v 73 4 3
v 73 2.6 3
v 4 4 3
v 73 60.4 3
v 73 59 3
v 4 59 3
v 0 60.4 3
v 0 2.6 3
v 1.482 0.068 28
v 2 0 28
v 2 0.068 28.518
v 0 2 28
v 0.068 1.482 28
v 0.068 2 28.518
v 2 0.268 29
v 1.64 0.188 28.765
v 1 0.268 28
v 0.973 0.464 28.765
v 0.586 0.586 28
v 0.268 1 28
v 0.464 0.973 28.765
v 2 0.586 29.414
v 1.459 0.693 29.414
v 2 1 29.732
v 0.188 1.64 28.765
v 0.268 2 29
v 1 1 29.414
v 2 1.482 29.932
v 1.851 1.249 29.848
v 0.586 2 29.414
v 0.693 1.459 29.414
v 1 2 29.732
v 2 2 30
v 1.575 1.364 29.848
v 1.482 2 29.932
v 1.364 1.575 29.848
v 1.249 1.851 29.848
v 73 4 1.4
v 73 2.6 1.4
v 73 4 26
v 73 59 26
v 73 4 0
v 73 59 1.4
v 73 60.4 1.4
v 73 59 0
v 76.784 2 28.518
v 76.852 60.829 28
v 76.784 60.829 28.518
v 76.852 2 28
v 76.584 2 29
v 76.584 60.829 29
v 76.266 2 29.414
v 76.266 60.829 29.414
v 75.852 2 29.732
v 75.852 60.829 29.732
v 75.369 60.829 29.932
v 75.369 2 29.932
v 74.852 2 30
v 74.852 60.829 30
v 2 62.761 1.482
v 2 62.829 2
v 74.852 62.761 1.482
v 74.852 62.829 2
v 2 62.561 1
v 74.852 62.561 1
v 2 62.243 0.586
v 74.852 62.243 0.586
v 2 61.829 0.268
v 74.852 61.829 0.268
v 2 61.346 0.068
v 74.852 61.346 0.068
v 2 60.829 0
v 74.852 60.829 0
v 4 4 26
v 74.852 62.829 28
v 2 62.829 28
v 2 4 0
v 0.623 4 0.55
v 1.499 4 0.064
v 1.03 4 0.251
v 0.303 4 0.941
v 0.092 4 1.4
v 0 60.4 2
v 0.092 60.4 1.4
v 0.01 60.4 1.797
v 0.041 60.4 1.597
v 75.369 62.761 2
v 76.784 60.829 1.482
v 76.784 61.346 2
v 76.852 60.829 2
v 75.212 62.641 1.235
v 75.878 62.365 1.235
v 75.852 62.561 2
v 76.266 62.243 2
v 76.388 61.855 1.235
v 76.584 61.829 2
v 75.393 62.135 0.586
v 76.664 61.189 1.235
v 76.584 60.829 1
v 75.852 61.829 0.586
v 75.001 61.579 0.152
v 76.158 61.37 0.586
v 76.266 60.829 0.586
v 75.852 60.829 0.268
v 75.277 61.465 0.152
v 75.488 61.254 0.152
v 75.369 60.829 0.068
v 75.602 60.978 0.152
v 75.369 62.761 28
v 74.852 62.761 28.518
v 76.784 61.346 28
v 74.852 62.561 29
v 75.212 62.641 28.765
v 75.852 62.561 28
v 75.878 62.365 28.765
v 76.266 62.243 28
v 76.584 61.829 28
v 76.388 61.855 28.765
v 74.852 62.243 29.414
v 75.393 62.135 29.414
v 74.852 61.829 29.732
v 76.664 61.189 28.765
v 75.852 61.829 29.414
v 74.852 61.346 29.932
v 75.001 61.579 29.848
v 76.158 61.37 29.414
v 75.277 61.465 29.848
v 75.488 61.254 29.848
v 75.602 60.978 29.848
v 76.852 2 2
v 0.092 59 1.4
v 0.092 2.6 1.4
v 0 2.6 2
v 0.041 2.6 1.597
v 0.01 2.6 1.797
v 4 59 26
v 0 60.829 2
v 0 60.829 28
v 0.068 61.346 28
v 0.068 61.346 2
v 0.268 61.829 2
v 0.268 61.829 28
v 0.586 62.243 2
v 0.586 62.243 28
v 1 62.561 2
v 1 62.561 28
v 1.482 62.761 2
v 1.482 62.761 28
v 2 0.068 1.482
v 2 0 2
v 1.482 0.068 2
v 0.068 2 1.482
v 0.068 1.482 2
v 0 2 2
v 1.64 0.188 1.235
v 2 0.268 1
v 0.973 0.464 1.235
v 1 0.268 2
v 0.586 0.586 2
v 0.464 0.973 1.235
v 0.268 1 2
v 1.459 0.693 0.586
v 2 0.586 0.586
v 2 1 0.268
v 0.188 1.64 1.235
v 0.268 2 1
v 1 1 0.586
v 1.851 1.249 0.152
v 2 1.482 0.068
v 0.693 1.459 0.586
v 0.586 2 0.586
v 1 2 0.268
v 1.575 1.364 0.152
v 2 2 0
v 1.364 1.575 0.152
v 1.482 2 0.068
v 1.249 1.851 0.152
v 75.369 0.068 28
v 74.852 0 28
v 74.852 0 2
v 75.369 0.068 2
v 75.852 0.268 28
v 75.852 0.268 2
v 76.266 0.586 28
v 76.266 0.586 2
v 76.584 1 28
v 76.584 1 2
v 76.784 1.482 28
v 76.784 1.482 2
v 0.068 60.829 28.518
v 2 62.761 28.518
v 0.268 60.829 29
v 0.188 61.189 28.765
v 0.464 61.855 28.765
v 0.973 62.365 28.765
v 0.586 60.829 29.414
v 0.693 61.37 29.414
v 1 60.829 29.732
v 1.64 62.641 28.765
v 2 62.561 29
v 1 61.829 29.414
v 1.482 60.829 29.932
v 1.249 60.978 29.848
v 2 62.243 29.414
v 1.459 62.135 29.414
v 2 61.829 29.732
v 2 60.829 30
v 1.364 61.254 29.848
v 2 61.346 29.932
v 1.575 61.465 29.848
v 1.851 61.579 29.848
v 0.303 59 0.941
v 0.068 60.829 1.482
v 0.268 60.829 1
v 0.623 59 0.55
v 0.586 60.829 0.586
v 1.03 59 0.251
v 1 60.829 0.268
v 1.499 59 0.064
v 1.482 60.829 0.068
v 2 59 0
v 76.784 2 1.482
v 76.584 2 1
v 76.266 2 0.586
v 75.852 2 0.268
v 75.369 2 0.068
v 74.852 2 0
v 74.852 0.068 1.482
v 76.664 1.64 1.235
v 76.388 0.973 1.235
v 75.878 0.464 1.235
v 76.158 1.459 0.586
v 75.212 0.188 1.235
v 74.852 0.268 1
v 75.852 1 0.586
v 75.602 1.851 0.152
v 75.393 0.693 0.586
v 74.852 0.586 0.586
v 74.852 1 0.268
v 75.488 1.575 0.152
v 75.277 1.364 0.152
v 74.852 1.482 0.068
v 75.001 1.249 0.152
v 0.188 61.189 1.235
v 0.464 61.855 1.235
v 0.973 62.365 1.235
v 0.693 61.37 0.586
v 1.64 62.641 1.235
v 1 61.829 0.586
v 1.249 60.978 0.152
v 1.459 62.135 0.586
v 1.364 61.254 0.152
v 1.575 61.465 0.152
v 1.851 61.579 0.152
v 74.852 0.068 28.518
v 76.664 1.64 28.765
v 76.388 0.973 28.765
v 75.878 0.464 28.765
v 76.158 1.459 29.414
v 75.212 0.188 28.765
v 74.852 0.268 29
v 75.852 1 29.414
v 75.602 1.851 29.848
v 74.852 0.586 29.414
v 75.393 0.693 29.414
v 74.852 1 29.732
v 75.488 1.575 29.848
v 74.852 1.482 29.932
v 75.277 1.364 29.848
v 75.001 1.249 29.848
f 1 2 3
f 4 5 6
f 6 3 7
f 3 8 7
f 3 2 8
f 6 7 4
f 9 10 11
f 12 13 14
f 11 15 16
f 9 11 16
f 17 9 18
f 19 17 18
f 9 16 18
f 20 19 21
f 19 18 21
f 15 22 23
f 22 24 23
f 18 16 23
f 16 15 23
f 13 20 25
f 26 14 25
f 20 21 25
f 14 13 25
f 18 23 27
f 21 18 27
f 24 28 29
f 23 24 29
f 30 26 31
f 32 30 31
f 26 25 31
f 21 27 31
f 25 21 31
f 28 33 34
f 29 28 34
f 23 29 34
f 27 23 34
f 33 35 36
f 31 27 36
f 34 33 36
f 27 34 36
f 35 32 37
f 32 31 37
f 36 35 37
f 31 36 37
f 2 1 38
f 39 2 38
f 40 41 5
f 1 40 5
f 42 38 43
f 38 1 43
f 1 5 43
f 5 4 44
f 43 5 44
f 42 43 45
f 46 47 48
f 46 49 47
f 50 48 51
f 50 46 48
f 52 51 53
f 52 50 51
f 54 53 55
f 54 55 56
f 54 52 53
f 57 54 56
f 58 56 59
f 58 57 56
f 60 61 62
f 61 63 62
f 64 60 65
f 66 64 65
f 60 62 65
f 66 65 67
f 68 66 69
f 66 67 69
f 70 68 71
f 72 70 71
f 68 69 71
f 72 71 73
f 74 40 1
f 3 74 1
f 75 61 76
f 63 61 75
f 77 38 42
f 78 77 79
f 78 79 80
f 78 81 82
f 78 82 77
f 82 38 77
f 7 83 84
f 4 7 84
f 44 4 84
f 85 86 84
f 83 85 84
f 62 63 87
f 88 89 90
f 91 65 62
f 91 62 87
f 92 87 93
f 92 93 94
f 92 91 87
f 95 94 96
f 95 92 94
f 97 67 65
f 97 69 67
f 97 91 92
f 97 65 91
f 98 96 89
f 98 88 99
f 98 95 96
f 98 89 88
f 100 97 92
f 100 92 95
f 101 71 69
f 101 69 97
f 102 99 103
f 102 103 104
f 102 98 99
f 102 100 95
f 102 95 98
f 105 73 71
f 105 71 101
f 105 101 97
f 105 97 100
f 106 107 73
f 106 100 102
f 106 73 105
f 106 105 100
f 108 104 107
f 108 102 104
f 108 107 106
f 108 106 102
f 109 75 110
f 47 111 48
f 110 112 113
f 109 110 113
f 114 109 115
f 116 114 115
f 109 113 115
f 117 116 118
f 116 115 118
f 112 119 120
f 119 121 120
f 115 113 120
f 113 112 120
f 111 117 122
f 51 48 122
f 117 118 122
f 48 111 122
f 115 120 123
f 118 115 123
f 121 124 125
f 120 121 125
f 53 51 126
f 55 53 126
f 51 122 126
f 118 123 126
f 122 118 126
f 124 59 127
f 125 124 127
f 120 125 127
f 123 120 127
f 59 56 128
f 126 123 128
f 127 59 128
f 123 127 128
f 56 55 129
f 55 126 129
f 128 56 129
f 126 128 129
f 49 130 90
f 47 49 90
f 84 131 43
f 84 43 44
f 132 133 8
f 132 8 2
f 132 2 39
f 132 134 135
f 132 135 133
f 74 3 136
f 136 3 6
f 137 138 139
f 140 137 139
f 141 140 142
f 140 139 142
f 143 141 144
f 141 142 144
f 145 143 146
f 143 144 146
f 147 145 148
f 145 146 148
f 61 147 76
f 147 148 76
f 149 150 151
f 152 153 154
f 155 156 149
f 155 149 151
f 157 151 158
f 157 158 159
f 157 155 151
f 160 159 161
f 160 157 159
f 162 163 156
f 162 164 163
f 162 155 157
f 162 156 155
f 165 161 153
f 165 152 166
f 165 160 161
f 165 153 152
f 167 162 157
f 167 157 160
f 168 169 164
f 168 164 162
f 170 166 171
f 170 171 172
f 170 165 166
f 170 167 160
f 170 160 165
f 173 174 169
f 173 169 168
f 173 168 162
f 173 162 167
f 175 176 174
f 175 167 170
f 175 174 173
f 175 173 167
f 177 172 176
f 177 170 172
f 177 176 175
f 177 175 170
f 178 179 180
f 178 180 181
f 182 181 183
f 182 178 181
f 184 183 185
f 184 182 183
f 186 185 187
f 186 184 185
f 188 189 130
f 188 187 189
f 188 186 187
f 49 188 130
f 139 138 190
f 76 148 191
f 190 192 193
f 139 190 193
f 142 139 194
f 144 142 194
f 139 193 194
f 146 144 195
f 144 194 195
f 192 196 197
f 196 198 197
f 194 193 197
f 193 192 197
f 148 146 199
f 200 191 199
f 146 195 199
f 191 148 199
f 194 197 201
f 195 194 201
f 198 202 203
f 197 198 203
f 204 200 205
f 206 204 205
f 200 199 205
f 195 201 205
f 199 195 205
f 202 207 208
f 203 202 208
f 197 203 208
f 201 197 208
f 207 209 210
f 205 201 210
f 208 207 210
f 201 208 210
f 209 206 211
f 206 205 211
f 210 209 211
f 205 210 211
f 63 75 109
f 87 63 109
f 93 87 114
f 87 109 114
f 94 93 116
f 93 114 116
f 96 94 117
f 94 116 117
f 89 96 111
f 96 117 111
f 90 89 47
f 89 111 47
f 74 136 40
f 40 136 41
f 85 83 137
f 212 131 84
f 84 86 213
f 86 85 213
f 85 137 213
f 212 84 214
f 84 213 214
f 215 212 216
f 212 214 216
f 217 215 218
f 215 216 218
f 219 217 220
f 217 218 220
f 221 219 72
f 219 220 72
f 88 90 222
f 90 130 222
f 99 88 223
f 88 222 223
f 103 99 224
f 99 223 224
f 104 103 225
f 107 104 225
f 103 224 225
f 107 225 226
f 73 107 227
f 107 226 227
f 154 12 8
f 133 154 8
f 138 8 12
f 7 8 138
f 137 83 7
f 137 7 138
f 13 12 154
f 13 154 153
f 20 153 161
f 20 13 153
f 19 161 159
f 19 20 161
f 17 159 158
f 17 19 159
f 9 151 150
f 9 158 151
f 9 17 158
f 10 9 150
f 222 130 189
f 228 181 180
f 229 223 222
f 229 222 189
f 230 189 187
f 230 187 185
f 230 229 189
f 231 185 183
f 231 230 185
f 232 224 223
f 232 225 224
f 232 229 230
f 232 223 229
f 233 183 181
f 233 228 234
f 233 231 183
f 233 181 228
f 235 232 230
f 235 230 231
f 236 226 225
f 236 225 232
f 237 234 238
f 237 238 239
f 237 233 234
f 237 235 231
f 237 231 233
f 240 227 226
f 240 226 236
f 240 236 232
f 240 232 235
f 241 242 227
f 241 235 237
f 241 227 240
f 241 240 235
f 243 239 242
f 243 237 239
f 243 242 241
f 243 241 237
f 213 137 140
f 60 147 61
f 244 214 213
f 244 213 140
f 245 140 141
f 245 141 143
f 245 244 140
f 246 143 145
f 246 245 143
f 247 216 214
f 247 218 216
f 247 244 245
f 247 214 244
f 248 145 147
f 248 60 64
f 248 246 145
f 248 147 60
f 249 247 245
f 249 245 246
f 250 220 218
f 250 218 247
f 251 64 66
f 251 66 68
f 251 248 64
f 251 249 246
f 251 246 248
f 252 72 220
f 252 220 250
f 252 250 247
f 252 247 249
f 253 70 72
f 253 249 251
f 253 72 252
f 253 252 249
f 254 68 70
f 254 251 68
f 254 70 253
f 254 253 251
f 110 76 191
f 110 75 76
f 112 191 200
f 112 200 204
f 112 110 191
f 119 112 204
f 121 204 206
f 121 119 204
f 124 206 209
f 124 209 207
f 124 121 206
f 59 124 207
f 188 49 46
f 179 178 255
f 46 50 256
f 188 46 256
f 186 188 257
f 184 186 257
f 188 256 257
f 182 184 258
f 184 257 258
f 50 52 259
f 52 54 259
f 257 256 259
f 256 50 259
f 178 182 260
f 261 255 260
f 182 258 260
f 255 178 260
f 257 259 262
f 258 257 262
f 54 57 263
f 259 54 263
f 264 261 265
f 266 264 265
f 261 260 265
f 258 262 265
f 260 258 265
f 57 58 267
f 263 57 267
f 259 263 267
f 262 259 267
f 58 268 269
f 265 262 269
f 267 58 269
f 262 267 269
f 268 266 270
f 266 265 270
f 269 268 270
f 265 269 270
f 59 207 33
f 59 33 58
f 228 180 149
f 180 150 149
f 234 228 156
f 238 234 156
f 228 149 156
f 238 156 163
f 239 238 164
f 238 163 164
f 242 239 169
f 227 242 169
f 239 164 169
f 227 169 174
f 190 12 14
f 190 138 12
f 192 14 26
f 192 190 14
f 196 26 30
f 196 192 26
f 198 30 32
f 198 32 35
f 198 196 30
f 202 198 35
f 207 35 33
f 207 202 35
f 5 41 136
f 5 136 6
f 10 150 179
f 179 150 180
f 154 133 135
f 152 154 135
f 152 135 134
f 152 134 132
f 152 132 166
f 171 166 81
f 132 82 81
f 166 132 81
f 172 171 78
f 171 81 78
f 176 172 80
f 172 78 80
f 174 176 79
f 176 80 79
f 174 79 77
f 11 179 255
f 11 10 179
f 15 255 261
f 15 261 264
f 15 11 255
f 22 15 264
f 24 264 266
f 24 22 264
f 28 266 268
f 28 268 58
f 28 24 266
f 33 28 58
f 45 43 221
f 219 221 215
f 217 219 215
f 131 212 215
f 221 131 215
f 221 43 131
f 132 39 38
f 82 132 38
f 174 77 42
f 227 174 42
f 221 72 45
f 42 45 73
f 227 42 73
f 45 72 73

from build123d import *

# Parameters (mm, degrees)
CROQUIS3_W              = 76.851762212
CROQUIS3_H              = 62.828734274
SALIENTE_EXTRUIR1_DEPTH = 30
CROQUIS4_W              = 69
CROQUIS4_H              = 55
CORTAR_EXTRUIR1_DEPTH   = 26
REDONDEO5_R             = 2
REDONDEO6_R             = 2
REDONDEO7_R             = 2
CROQUIS5_W              = 3
CROQUIS5_H              = 55
CORTAR_EXTRUIR2_DEPTH   = 70
CROQUIS6_W              = 1.6
CROQUIS6_H              = 57.8
CORTAR_EXTRUIR3_DEPTH   = 73


with BuildPart() as part:
    # Croquis3 → Saliente-Extruir1 (new body)
    with BuildSketch(Plane.XY):
        with Locations((38.425881106, 31.414367137)):
            Rectangle(CROQUIS3_W, CROQUIS3_H)
    extrude(amount=SALIENTE_EXTRUIR1_DEPTH)

    # Croquis4 → Cortar-Extruir1 (cut)
    with BuildSketch(Plane.XY):
        with Locations((38.5, 31.5)):
            Rectangle(CROQUIS4_W, CROQUIS4_H)
    extrude(amount=CORTAR_EXTRUIR1_DEPTH, mode=Mode.SUBTRACT)

    # Redondeo5
    redondeo5_edges = [part.edges().sort_by_distance(p)[0] for p in [
        (0, 0, 15),
        (0, 62.828734274, 15),
        (76.851762212, 62.828734274, 15),
        (76.851762212, 0, 15),
    ]]
    fillet(redondeo5_edges, radius=REDONDEO5_R)

    # Redondeo6
    redondeo6_edges = [part.edges().sort_by_distance(p)[0] for p in [
        (0, 31.414367137, 0),
        (38.425881106, 0, 0),
        (38.425881106, 62.828734274, 0),
        (76.851762212, 31.414367137, 0),
        (76.265975775, 62.242947836, 0),
        (76.265975775, 0.585786438, 0),
        (0.585786438, 0.585786438, 0),
        (0.585786438, 62.242947836, 0),
    ]]
    fillet(redondeo6_edges, radius=REDONDEO6_R)

    # Redondeo7
    redondeo7_edges = [part.edges().sort_by_distance(p)[0] for p in [
        (0, 31.414367137, 30),
        (38.425881106, 62.828734274, 30),
        (38.425881106, 0, 30),
        (76.851762212, 31.414367137, 30),
        (76.265975775, 62.242947836, 30),
        (76.265975775, 0.585786438, 30),
        (0.585786438, 0.585786438, 30),
        (0.585786438, 62.242947836, 30),
    ]]
    fillet(redondeo7_edges, radius=REDONDEO7_R)

    # Croquis5 → Cortar-Extruir2 (cut)
    with BuildSketch(Plane(origin=(0, 0, 0), x_dir=(0, 0, -1), z_dir=(1, 0, 0))):
        with Locations((-1.5, 31.5)):
            Rectangle(CROQUIS5_W, CROQUIS5_H)
    extrude(amount=CORTAR_EXTRUIR2_DEPTH, mode=Mode.SUBTRACT)

    # Croquis6 → Cortar-Extruir3 (cut)
    with BuildSketch(Plane(origin=(0, 0, 0), x_dir=(0, 0, -1), z_dir=(1, 0, 0))):
        with Locations((-2.2, 31.5)):
            Rectangle(CROQUIS6_W, CROQUIS6_H)
    extrude(amount=CORTAR_EXTRUIR3_DEPTH, mode=Mode.SUBTRACT)


solid = part.part
